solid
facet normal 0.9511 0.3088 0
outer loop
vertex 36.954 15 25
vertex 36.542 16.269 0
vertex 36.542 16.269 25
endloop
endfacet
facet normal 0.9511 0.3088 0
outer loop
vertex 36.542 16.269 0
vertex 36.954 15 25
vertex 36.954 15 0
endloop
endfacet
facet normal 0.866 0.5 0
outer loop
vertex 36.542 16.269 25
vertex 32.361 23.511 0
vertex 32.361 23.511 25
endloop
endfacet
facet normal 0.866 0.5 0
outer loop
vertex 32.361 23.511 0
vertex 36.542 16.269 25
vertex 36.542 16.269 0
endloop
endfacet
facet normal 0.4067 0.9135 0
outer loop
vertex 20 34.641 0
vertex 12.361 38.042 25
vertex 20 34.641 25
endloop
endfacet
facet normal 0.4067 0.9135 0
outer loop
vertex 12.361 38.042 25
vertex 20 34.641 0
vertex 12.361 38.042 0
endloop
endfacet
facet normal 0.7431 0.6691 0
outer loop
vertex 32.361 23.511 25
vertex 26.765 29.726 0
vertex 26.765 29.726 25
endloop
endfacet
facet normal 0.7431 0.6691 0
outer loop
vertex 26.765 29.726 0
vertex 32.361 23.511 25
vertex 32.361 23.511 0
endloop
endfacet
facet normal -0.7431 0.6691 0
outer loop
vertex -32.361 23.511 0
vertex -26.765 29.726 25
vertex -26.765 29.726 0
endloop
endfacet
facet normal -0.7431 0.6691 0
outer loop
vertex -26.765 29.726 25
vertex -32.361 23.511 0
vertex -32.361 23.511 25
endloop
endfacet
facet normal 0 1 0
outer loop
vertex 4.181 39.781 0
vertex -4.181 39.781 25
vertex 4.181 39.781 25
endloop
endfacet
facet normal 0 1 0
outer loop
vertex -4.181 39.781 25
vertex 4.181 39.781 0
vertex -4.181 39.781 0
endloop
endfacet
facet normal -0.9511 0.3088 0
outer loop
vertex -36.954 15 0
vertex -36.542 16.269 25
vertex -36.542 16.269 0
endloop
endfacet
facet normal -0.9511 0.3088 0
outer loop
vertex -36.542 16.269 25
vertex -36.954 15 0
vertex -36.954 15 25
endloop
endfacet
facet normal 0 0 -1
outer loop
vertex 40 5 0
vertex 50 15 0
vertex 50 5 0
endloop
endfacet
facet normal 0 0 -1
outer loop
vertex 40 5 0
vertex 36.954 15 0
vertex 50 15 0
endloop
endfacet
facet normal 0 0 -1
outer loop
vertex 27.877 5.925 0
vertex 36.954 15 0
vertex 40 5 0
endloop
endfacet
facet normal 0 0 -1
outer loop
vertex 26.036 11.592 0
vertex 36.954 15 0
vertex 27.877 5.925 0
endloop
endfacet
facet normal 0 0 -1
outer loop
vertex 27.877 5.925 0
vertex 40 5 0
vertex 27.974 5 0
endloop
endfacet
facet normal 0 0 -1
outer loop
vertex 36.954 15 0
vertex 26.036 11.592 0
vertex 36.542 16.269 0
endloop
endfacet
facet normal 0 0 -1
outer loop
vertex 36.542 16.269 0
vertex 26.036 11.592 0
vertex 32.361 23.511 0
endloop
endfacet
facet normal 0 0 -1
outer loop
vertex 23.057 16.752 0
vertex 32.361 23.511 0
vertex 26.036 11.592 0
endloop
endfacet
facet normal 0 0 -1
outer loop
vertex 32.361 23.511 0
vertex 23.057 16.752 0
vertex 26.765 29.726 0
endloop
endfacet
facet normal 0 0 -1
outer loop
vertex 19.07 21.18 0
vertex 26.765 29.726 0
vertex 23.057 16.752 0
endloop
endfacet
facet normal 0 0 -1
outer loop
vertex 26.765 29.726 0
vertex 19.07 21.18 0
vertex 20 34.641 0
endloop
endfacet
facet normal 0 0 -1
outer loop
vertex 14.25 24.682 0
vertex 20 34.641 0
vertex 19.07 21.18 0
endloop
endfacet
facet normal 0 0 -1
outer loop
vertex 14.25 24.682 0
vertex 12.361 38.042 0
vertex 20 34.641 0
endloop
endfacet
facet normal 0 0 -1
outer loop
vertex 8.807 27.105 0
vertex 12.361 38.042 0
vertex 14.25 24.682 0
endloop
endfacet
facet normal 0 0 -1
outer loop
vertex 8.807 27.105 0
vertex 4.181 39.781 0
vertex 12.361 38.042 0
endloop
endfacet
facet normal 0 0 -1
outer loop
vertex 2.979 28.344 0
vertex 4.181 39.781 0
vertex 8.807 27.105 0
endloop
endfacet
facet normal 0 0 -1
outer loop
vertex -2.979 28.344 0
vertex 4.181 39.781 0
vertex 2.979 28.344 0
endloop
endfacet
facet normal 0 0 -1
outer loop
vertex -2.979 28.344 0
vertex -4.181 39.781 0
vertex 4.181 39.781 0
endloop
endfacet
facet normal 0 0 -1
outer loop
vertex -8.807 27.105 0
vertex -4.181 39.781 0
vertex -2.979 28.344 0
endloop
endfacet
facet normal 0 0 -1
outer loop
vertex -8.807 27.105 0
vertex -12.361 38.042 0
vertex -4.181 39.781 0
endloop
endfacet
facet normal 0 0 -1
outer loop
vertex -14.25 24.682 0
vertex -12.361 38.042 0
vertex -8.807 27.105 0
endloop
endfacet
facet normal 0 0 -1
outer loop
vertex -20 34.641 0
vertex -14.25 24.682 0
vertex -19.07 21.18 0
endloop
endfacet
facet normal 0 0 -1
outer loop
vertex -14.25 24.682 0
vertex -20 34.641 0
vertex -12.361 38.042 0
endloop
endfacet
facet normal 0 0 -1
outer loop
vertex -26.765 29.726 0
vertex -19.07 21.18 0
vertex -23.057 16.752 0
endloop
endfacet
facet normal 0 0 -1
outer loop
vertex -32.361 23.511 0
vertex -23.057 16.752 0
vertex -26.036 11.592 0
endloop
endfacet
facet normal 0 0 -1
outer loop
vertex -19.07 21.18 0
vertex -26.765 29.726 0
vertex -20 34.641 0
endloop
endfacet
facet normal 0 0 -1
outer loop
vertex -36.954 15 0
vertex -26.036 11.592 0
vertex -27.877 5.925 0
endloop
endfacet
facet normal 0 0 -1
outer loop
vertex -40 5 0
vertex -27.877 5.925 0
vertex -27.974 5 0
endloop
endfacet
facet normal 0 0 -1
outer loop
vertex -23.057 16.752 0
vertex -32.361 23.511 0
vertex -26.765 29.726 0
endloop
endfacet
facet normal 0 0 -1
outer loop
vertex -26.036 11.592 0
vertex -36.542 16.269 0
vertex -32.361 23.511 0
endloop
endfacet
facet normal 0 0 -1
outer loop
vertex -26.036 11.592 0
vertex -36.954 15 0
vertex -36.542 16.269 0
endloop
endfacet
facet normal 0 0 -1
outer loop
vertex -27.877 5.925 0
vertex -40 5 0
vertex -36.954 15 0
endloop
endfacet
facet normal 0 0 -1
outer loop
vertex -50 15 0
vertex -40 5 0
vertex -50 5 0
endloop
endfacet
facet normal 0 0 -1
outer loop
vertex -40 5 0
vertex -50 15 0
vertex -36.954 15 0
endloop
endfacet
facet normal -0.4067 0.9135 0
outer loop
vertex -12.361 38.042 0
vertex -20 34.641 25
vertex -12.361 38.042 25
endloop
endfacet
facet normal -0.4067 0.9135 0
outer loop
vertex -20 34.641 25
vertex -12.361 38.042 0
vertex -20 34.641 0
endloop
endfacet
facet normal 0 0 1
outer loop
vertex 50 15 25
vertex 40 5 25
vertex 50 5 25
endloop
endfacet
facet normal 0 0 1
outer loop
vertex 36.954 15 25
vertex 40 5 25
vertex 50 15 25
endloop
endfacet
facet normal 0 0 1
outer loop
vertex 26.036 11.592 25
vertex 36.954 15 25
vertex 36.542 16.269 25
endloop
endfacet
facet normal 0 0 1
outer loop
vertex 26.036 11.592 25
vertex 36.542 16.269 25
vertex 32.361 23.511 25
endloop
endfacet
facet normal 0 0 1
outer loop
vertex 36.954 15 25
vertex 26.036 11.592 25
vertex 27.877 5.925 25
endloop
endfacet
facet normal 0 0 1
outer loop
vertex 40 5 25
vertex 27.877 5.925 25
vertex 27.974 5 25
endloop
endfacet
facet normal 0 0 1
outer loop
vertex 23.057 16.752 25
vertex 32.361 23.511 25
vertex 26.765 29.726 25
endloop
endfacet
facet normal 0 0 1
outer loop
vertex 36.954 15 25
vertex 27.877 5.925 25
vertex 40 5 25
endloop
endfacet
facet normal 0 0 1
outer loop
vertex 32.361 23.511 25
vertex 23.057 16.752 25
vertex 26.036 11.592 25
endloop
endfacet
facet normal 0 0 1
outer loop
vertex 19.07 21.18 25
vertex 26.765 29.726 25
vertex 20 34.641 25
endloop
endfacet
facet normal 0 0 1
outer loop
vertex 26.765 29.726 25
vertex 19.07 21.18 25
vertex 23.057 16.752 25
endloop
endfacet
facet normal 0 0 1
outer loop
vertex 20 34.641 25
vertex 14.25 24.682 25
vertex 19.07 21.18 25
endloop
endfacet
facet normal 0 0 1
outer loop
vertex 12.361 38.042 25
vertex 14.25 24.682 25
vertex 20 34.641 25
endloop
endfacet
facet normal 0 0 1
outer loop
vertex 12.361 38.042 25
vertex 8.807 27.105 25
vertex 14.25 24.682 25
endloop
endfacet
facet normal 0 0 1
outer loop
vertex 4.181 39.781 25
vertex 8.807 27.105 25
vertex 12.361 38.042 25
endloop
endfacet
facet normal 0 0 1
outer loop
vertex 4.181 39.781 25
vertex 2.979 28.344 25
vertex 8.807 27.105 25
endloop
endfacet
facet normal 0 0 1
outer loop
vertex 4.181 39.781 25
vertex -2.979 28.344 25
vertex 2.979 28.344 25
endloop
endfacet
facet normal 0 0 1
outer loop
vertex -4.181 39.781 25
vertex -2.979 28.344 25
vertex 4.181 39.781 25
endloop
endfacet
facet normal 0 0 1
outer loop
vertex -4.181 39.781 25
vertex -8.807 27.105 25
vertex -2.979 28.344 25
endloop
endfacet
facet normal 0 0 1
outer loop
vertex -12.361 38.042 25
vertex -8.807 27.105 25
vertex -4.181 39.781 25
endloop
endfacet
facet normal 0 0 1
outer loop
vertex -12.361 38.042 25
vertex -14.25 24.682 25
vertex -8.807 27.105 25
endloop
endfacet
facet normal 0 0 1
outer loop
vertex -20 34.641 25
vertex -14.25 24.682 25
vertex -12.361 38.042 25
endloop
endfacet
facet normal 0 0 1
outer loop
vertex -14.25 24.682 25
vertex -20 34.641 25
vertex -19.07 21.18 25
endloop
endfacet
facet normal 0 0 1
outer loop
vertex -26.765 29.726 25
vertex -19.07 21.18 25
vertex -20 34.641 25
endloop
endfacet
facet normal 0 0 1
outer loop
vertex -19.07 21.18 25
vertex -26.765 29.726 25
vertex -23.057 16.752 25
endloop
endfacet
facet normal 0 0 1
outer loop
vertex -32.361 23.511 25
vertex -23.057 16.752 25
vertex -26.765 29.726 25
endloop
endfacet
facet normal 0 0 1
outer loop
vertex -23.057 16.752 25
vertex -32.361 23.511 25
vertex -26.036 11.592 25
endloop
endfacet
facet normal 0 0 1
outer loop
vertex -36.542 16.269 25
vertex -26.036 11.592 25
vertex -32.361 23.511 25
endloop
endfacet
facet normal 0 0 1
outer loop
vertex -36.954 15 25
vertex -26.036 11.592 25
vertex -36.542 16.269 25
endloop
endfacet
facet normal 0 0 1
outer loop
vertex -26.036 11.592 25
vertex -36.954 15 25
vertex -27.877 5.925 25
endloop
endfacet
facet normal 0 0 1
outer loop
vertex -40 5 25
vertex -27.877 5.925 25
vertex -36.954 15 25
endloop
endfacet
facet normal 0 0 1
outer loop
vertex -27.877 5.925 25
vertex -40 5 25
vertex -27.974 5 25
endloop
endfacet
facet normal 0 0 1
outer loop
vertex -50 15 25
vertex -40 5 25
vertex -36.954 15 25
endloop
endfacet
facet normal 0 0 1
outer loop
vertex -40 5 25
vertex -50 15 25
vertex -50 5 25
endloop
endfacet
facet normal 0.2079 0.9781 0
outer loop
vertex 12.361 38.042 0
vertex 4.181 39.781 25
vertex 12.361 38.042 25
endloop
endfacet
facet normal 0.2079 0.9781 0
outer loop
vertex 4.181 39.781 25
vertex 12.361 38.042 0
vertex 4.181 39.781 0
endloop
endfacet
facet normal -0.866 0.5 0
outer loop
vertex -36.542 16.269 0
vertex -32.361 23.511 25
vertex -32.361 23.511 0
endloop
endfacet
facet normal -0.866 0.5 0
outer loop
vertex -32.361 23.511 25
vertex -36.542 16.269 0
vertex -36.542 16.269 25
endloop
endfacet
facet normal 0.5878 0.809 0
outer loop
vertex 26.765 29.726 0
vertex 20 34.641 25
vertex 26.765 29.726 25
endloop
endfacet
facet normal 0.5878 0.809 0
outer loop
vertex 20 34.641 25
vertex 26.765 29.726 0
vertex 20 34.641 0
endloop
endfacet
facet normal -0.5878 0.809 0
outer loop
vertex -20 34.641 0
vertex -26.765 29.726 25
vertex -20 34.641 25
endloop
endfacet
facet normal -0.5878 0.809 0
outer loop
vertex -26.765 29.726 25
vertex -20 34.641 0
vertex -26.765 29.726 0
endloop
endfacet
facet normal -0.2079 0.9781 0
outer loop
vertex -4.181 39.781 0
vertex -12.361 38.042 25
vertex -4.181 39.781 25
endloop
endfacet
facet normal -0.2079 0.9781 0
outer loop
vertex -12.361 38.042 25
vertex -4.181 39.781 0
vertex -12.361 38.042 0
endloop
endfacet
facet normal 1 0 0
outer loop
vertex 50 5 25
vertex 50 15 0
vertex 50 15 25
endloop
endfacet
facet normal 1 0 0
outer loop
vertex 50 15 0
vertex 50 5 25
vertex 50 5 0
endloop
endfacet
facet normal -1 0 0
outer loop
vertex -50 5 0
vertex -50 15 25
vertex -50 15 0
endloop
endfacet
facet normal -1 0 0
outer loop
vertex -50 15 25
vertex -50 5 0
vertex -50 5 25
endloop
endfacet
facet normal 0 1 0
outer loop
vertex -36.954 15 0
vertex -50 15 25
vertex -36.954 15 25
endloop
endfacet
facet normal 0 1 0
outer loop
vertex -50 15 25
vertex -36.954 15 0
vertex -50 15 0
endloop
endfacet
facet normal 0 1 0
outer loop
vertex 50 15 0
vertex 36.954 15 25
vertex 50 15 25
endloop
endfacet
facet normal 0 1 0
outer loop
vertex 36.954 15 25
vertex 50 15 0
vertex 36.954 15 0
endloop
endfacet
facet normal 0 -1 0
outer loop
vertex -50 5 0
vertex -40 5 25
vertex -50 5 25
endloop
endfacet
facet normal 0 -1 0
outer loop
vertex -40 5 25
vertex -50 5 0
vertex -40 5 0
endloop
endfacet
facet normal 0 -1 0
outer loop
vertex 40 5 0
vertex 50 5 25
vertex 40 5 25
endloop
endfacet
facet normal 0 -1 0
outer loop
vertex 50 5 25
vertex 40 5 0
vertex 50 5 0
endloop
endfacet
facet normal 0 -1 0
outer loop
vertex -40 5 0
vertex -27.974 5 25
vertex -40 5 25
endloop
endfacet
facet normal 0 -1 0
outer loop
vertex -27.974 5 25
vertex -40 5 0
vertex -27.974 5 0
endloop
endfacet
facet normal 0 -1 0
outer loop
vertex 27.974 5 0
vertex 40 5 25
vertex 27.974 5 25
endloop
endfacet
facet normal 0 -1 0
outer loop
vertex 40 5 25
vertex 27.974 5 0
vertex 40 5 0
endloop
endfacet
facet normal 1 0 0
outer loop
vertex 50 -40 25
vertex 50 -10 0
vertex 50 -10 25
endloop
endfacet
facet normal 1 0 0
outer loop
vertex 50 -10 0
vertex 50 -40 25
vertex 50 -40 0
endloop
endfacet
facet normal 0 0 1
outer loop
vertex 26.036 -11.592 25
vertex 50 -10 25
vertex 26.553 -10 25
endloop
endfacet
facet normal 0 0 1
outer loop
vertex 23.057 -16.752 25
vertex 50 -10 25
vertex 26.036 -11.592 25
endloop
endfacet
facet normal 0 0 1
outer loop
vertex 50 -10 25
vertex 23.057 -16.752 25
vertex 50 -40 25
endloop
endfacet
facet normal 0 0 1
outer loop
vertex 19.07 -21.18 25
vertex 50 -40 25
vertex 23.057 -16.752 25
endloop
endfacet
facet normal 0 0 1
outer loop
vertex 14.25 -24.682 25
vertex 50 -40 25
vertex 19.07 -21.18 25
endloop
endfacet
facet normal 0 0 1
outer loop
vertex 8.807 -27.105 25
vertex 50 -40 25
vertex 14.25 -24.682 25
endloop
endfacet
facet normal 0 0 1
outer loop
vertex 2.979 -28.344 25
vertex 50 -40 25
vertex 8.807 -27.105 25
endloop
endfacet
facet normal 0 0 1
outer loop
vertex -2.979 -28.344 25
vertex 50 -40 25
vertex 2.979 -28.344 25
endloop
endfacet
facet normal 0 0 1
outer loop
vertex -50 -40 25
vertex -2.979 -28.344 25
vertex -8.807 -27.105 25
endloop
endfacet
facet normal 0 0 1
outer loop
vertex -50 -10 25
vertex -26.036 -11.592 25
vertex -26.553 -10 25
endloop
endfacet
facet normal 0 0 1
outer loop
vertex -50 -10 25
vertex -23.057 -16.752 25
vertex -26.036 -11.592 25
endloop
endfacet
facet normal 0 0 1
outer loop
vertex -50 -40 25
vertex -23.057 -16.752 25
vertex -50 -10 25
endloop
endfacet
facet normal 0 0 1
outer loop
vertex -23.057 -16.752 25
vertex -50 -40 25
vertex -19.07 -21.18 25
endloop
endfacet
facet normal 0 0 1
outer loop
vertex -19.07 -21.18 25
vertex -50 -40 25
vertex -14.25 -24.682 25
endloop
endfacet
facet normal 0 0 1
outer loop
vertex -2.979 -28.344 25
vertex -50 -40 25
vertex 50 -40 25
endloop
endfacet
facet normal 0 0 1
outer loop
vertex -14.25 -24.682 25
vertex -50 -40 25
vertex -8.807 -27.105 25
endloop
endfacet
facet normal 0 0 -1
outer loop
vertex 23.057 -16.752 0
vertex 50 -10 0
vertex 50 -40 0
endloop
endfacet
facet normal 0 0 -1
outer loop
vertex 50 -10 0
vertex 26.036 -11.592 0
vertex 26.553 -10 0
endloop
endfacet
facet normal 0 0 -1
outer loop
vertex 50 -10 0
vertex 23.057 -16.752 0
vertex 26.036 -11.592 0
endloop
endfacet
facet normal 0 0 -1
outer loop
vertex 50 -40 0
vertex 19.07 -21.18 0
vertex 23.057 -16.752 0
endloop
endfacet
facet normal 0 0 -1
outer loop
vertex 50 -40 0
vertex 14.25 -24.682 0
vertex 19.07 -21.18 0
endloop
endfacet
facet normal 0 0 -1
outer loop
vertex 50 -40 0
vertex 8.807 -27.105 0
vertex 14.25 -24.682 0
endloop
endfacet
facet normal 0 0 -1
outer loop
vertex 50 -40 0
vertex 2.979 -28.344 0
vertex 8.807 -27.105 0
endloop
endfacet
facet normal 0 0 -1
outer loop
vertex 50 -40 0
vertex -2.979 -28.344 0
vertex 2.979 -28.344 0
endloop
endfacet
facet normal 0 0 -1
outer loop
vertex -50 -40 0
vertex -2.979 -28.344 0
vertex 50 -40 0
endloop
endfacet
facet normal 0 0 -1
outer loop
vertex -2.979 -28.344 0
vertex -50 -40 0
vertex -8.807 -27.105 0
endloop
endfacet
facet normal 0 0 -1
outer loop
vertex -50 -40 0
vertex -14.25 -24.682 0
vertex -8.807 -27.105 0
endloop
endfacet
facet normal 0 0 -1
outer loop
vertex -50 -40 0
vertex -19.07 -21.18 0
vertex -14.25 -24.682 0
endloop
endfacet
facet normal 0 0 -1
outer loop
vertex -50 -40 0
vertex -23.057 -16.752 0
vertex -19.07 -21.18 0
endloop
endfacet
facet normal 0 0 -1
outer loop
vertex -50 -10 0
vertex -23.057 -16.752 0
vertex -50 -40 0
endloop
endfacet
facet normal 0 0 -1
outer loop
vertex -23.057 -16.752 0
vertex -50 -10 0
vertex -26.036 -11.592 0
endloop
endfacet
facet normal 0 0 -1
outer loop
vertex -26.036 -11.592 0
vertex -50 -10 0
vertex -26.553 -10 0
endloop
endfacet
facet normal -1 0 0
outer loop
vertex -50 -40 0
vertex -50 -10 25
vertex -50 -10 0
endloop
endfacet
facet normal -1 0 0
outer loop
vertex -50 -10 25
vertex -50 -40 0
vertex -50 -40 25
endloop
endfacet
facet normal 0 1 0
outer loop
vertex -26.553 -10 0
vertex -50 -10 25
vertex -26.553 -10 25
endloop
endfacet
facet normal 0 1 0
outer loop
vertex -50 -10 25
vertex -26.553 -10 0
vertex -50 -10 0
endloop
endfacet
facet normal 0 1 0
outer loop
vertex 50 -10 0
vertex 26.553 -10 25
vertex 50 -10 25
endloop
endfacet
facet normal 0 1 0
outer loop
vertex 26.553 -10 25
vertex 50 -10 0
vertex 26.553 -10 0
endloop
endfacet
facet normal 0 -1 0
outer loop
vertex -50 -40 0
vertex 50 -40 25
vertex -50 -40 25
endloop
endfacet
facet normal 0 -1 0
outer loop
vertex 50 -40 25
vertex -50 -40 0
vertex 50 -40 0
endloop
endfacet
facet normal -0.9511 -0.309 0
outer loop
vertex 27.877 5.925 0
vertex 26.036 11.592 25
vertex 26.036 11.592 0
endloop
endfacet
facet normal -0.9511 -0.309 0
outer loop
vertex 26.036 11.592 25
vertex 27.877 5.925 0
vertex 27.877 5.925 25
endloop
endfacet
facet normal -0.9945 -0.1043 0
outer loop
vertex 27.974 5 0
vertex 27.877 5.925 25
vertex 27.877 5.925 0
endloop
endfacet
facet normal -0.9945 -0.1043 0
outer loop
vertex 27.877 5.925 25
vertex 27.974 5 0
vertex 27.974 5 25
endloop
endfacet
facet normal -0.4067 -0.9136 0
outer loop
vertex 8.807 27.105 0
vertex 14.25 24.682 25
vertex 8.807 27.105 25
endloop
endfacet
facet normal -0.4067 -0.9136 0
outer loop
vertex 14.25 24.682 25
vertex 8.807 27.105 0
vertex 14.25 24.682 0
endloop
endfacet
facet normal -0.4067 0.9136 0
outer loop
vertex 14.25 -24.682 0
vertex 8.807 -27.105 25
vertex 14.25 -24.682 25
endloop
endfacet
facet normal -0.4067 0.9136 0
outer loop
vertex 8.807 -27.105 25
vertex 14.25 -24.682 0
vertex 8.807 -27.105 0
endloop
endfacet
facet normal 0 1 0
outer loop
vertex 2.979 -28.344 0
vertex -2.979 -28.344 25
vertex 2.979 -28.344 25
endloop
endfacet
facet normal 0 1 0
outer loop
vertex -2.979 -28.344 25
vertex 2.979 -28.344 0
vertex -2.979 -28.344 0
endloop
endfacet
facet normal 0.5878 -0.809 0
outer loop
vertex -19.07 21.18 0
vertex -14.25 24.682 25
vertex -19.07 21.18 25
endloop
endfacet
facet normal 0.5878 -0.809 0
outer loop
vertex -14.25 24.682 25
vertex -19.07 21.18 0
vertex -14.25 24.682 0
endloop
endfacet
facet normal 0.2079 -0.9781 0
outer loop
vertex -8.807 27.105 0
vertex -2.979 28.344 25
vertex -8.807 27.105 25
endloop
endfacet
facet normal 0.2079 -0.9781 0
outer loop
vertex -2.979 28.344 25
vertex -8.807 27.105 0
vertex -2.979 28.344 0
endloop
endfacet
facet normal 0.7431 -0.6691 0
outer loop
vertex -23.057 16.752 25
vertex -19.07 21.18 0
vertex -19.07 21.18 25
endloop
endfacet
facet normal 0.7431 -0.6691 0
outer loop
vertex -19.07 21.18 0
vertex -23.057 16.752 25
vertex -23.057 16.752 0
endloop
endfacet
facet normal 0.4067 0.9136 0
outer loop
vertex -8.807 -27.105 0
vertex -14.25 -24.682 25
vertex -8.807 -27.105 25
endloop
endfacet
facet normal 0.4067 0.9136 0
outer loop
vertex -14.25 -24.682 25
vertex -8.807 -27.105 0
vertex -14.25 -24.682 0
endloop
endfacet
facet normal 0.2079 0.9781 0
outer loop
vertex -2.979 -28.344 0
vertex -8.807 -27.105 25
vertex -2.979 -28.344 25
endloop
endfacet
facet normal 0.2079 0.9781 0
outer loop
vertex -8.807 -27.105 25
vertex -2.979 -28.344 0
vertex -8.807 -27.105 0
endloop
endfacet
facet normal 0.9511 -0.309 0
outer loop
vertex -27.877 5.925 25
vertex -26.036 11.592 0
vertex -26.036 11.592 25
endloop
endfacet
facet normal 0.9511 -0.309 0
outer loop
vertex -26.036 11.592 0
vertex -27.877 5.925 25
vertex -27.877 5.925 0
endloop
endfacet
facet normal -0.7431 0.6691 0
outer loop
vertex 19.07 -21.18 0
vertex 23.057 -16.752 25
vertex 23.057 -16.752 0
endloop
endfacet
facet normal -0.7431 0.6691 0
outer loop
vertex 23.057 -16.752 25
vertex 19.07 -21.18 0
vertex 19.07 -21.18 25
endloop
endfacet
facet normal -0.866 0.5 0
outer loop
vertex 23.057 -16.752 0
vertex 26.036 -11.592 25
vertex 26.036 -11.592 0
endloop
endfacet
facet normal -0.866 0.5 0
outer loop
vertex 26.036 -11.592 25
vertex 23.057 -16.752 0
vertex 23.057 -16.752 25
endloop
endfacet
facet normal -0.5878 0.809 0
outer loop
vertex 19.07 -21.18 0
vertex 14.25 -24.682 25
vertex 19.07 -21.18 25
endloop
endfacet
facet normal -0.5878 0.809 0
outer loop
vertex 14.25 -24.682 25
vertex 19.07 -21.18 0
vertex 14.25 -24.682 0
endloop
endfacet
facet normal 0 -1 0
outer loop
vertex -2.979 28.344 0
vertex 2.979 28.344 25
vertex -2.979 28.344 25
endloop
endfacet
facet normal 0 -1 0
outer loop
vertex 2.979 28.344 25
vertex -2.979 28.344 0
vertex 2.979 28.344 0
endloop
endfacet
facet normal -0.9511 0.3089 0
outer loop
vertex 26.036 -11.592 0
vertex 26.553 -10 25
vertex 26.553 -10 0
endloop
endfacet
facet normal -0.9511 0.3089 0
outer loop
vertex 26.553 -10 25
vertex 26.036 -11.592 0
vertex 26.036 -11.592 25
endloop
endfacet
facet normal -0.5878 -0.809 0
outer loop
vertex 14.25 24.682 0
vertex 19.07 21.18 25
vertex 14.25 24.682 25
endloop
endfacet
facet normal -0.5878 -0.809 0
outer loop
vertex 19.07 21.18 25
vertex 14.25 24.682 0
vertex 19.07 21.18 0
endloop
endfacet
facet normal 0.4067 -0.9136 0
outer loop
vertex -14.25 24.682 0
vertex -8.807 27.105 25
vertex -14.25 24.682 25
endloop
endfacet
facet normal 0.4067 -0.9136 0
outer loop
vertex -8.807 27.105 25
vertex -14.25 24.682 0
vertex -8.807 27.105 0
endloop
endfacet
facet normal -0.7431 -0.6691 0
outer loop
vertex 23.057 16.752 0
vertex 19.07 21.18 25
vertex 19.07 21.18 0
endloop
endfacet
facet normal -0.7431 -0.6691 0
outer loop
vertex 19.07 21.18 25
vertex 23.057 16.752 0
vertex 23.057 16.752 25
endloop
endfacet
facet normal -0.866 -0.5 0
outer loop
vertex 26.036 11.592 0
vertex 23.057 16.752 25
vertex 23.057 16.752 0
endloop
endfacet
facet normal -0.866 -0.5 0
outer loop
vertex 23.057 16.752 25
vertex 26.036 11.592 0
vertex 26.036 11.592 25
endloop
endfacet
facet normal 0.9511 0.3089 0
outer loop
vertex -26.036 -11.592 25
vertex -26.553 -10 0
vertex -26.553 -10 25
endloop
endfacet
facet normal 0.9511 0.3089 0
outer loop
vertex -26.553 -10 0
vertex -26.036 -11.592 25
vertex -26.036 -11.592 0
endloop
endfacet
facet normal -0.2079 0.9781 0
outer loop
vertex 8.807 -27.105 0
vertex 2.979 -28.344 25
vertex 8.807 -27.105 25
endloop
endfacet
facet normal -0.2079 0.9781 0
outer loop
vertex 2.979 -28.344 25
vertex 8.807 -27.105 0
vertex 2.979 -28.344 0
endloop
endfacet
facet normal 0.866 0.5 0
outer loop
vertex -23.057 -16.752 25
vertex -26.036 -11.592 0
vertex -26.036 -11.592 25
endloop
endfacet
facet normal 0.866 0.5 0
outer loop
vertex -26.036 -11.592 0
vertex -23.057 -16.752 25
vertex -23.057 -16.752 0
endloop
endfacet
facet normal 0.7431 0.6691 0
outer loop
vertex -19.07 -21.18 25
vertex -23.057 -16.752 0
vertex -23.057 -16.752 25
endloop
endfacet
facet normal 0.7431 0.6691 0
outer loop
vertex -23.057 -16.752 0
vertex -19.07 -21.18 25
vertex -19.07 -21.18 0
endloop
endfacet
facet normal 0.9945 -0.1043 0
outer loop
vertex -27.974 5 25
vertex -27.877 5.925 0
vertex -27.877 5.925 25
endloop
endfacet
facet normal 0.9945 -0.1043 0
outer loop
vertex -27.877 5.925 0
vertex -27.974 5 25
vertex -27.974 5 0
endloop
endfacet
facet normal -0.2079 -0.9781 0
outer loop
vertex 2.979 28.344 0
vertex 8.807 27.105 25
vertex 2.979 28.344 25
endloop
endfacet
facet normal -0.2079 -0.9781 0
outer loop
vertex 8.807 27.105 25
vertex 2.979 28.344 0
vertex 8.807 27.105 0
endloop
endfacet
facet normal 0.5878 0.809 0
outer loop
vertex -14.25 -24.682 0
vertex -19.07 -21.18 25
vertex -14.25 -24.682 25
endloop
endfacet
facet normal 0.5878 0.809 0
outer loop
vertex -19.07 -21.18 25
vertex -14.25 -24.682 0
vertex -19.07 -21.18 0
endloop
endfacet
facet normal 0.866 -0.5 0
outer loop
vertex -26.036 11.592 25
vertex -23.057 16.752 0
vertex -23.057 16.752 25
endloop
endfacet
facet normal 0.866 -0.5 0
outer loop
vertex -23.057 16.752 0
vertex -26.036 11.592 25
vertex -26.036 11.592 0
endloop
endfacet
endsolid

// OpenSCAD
difference(){
union(){
difference(){
union(){cylinder(h=25,r=40);translate([0,10,12.5])cube([100,10,25],center=true);}
translate([0,-35,0])cube(80,center=true);
}
translate([-50,-40,0])cube([100,30,25]);
}
translate([0,0,-50])cylinder(h=115,r=28.5);
}
